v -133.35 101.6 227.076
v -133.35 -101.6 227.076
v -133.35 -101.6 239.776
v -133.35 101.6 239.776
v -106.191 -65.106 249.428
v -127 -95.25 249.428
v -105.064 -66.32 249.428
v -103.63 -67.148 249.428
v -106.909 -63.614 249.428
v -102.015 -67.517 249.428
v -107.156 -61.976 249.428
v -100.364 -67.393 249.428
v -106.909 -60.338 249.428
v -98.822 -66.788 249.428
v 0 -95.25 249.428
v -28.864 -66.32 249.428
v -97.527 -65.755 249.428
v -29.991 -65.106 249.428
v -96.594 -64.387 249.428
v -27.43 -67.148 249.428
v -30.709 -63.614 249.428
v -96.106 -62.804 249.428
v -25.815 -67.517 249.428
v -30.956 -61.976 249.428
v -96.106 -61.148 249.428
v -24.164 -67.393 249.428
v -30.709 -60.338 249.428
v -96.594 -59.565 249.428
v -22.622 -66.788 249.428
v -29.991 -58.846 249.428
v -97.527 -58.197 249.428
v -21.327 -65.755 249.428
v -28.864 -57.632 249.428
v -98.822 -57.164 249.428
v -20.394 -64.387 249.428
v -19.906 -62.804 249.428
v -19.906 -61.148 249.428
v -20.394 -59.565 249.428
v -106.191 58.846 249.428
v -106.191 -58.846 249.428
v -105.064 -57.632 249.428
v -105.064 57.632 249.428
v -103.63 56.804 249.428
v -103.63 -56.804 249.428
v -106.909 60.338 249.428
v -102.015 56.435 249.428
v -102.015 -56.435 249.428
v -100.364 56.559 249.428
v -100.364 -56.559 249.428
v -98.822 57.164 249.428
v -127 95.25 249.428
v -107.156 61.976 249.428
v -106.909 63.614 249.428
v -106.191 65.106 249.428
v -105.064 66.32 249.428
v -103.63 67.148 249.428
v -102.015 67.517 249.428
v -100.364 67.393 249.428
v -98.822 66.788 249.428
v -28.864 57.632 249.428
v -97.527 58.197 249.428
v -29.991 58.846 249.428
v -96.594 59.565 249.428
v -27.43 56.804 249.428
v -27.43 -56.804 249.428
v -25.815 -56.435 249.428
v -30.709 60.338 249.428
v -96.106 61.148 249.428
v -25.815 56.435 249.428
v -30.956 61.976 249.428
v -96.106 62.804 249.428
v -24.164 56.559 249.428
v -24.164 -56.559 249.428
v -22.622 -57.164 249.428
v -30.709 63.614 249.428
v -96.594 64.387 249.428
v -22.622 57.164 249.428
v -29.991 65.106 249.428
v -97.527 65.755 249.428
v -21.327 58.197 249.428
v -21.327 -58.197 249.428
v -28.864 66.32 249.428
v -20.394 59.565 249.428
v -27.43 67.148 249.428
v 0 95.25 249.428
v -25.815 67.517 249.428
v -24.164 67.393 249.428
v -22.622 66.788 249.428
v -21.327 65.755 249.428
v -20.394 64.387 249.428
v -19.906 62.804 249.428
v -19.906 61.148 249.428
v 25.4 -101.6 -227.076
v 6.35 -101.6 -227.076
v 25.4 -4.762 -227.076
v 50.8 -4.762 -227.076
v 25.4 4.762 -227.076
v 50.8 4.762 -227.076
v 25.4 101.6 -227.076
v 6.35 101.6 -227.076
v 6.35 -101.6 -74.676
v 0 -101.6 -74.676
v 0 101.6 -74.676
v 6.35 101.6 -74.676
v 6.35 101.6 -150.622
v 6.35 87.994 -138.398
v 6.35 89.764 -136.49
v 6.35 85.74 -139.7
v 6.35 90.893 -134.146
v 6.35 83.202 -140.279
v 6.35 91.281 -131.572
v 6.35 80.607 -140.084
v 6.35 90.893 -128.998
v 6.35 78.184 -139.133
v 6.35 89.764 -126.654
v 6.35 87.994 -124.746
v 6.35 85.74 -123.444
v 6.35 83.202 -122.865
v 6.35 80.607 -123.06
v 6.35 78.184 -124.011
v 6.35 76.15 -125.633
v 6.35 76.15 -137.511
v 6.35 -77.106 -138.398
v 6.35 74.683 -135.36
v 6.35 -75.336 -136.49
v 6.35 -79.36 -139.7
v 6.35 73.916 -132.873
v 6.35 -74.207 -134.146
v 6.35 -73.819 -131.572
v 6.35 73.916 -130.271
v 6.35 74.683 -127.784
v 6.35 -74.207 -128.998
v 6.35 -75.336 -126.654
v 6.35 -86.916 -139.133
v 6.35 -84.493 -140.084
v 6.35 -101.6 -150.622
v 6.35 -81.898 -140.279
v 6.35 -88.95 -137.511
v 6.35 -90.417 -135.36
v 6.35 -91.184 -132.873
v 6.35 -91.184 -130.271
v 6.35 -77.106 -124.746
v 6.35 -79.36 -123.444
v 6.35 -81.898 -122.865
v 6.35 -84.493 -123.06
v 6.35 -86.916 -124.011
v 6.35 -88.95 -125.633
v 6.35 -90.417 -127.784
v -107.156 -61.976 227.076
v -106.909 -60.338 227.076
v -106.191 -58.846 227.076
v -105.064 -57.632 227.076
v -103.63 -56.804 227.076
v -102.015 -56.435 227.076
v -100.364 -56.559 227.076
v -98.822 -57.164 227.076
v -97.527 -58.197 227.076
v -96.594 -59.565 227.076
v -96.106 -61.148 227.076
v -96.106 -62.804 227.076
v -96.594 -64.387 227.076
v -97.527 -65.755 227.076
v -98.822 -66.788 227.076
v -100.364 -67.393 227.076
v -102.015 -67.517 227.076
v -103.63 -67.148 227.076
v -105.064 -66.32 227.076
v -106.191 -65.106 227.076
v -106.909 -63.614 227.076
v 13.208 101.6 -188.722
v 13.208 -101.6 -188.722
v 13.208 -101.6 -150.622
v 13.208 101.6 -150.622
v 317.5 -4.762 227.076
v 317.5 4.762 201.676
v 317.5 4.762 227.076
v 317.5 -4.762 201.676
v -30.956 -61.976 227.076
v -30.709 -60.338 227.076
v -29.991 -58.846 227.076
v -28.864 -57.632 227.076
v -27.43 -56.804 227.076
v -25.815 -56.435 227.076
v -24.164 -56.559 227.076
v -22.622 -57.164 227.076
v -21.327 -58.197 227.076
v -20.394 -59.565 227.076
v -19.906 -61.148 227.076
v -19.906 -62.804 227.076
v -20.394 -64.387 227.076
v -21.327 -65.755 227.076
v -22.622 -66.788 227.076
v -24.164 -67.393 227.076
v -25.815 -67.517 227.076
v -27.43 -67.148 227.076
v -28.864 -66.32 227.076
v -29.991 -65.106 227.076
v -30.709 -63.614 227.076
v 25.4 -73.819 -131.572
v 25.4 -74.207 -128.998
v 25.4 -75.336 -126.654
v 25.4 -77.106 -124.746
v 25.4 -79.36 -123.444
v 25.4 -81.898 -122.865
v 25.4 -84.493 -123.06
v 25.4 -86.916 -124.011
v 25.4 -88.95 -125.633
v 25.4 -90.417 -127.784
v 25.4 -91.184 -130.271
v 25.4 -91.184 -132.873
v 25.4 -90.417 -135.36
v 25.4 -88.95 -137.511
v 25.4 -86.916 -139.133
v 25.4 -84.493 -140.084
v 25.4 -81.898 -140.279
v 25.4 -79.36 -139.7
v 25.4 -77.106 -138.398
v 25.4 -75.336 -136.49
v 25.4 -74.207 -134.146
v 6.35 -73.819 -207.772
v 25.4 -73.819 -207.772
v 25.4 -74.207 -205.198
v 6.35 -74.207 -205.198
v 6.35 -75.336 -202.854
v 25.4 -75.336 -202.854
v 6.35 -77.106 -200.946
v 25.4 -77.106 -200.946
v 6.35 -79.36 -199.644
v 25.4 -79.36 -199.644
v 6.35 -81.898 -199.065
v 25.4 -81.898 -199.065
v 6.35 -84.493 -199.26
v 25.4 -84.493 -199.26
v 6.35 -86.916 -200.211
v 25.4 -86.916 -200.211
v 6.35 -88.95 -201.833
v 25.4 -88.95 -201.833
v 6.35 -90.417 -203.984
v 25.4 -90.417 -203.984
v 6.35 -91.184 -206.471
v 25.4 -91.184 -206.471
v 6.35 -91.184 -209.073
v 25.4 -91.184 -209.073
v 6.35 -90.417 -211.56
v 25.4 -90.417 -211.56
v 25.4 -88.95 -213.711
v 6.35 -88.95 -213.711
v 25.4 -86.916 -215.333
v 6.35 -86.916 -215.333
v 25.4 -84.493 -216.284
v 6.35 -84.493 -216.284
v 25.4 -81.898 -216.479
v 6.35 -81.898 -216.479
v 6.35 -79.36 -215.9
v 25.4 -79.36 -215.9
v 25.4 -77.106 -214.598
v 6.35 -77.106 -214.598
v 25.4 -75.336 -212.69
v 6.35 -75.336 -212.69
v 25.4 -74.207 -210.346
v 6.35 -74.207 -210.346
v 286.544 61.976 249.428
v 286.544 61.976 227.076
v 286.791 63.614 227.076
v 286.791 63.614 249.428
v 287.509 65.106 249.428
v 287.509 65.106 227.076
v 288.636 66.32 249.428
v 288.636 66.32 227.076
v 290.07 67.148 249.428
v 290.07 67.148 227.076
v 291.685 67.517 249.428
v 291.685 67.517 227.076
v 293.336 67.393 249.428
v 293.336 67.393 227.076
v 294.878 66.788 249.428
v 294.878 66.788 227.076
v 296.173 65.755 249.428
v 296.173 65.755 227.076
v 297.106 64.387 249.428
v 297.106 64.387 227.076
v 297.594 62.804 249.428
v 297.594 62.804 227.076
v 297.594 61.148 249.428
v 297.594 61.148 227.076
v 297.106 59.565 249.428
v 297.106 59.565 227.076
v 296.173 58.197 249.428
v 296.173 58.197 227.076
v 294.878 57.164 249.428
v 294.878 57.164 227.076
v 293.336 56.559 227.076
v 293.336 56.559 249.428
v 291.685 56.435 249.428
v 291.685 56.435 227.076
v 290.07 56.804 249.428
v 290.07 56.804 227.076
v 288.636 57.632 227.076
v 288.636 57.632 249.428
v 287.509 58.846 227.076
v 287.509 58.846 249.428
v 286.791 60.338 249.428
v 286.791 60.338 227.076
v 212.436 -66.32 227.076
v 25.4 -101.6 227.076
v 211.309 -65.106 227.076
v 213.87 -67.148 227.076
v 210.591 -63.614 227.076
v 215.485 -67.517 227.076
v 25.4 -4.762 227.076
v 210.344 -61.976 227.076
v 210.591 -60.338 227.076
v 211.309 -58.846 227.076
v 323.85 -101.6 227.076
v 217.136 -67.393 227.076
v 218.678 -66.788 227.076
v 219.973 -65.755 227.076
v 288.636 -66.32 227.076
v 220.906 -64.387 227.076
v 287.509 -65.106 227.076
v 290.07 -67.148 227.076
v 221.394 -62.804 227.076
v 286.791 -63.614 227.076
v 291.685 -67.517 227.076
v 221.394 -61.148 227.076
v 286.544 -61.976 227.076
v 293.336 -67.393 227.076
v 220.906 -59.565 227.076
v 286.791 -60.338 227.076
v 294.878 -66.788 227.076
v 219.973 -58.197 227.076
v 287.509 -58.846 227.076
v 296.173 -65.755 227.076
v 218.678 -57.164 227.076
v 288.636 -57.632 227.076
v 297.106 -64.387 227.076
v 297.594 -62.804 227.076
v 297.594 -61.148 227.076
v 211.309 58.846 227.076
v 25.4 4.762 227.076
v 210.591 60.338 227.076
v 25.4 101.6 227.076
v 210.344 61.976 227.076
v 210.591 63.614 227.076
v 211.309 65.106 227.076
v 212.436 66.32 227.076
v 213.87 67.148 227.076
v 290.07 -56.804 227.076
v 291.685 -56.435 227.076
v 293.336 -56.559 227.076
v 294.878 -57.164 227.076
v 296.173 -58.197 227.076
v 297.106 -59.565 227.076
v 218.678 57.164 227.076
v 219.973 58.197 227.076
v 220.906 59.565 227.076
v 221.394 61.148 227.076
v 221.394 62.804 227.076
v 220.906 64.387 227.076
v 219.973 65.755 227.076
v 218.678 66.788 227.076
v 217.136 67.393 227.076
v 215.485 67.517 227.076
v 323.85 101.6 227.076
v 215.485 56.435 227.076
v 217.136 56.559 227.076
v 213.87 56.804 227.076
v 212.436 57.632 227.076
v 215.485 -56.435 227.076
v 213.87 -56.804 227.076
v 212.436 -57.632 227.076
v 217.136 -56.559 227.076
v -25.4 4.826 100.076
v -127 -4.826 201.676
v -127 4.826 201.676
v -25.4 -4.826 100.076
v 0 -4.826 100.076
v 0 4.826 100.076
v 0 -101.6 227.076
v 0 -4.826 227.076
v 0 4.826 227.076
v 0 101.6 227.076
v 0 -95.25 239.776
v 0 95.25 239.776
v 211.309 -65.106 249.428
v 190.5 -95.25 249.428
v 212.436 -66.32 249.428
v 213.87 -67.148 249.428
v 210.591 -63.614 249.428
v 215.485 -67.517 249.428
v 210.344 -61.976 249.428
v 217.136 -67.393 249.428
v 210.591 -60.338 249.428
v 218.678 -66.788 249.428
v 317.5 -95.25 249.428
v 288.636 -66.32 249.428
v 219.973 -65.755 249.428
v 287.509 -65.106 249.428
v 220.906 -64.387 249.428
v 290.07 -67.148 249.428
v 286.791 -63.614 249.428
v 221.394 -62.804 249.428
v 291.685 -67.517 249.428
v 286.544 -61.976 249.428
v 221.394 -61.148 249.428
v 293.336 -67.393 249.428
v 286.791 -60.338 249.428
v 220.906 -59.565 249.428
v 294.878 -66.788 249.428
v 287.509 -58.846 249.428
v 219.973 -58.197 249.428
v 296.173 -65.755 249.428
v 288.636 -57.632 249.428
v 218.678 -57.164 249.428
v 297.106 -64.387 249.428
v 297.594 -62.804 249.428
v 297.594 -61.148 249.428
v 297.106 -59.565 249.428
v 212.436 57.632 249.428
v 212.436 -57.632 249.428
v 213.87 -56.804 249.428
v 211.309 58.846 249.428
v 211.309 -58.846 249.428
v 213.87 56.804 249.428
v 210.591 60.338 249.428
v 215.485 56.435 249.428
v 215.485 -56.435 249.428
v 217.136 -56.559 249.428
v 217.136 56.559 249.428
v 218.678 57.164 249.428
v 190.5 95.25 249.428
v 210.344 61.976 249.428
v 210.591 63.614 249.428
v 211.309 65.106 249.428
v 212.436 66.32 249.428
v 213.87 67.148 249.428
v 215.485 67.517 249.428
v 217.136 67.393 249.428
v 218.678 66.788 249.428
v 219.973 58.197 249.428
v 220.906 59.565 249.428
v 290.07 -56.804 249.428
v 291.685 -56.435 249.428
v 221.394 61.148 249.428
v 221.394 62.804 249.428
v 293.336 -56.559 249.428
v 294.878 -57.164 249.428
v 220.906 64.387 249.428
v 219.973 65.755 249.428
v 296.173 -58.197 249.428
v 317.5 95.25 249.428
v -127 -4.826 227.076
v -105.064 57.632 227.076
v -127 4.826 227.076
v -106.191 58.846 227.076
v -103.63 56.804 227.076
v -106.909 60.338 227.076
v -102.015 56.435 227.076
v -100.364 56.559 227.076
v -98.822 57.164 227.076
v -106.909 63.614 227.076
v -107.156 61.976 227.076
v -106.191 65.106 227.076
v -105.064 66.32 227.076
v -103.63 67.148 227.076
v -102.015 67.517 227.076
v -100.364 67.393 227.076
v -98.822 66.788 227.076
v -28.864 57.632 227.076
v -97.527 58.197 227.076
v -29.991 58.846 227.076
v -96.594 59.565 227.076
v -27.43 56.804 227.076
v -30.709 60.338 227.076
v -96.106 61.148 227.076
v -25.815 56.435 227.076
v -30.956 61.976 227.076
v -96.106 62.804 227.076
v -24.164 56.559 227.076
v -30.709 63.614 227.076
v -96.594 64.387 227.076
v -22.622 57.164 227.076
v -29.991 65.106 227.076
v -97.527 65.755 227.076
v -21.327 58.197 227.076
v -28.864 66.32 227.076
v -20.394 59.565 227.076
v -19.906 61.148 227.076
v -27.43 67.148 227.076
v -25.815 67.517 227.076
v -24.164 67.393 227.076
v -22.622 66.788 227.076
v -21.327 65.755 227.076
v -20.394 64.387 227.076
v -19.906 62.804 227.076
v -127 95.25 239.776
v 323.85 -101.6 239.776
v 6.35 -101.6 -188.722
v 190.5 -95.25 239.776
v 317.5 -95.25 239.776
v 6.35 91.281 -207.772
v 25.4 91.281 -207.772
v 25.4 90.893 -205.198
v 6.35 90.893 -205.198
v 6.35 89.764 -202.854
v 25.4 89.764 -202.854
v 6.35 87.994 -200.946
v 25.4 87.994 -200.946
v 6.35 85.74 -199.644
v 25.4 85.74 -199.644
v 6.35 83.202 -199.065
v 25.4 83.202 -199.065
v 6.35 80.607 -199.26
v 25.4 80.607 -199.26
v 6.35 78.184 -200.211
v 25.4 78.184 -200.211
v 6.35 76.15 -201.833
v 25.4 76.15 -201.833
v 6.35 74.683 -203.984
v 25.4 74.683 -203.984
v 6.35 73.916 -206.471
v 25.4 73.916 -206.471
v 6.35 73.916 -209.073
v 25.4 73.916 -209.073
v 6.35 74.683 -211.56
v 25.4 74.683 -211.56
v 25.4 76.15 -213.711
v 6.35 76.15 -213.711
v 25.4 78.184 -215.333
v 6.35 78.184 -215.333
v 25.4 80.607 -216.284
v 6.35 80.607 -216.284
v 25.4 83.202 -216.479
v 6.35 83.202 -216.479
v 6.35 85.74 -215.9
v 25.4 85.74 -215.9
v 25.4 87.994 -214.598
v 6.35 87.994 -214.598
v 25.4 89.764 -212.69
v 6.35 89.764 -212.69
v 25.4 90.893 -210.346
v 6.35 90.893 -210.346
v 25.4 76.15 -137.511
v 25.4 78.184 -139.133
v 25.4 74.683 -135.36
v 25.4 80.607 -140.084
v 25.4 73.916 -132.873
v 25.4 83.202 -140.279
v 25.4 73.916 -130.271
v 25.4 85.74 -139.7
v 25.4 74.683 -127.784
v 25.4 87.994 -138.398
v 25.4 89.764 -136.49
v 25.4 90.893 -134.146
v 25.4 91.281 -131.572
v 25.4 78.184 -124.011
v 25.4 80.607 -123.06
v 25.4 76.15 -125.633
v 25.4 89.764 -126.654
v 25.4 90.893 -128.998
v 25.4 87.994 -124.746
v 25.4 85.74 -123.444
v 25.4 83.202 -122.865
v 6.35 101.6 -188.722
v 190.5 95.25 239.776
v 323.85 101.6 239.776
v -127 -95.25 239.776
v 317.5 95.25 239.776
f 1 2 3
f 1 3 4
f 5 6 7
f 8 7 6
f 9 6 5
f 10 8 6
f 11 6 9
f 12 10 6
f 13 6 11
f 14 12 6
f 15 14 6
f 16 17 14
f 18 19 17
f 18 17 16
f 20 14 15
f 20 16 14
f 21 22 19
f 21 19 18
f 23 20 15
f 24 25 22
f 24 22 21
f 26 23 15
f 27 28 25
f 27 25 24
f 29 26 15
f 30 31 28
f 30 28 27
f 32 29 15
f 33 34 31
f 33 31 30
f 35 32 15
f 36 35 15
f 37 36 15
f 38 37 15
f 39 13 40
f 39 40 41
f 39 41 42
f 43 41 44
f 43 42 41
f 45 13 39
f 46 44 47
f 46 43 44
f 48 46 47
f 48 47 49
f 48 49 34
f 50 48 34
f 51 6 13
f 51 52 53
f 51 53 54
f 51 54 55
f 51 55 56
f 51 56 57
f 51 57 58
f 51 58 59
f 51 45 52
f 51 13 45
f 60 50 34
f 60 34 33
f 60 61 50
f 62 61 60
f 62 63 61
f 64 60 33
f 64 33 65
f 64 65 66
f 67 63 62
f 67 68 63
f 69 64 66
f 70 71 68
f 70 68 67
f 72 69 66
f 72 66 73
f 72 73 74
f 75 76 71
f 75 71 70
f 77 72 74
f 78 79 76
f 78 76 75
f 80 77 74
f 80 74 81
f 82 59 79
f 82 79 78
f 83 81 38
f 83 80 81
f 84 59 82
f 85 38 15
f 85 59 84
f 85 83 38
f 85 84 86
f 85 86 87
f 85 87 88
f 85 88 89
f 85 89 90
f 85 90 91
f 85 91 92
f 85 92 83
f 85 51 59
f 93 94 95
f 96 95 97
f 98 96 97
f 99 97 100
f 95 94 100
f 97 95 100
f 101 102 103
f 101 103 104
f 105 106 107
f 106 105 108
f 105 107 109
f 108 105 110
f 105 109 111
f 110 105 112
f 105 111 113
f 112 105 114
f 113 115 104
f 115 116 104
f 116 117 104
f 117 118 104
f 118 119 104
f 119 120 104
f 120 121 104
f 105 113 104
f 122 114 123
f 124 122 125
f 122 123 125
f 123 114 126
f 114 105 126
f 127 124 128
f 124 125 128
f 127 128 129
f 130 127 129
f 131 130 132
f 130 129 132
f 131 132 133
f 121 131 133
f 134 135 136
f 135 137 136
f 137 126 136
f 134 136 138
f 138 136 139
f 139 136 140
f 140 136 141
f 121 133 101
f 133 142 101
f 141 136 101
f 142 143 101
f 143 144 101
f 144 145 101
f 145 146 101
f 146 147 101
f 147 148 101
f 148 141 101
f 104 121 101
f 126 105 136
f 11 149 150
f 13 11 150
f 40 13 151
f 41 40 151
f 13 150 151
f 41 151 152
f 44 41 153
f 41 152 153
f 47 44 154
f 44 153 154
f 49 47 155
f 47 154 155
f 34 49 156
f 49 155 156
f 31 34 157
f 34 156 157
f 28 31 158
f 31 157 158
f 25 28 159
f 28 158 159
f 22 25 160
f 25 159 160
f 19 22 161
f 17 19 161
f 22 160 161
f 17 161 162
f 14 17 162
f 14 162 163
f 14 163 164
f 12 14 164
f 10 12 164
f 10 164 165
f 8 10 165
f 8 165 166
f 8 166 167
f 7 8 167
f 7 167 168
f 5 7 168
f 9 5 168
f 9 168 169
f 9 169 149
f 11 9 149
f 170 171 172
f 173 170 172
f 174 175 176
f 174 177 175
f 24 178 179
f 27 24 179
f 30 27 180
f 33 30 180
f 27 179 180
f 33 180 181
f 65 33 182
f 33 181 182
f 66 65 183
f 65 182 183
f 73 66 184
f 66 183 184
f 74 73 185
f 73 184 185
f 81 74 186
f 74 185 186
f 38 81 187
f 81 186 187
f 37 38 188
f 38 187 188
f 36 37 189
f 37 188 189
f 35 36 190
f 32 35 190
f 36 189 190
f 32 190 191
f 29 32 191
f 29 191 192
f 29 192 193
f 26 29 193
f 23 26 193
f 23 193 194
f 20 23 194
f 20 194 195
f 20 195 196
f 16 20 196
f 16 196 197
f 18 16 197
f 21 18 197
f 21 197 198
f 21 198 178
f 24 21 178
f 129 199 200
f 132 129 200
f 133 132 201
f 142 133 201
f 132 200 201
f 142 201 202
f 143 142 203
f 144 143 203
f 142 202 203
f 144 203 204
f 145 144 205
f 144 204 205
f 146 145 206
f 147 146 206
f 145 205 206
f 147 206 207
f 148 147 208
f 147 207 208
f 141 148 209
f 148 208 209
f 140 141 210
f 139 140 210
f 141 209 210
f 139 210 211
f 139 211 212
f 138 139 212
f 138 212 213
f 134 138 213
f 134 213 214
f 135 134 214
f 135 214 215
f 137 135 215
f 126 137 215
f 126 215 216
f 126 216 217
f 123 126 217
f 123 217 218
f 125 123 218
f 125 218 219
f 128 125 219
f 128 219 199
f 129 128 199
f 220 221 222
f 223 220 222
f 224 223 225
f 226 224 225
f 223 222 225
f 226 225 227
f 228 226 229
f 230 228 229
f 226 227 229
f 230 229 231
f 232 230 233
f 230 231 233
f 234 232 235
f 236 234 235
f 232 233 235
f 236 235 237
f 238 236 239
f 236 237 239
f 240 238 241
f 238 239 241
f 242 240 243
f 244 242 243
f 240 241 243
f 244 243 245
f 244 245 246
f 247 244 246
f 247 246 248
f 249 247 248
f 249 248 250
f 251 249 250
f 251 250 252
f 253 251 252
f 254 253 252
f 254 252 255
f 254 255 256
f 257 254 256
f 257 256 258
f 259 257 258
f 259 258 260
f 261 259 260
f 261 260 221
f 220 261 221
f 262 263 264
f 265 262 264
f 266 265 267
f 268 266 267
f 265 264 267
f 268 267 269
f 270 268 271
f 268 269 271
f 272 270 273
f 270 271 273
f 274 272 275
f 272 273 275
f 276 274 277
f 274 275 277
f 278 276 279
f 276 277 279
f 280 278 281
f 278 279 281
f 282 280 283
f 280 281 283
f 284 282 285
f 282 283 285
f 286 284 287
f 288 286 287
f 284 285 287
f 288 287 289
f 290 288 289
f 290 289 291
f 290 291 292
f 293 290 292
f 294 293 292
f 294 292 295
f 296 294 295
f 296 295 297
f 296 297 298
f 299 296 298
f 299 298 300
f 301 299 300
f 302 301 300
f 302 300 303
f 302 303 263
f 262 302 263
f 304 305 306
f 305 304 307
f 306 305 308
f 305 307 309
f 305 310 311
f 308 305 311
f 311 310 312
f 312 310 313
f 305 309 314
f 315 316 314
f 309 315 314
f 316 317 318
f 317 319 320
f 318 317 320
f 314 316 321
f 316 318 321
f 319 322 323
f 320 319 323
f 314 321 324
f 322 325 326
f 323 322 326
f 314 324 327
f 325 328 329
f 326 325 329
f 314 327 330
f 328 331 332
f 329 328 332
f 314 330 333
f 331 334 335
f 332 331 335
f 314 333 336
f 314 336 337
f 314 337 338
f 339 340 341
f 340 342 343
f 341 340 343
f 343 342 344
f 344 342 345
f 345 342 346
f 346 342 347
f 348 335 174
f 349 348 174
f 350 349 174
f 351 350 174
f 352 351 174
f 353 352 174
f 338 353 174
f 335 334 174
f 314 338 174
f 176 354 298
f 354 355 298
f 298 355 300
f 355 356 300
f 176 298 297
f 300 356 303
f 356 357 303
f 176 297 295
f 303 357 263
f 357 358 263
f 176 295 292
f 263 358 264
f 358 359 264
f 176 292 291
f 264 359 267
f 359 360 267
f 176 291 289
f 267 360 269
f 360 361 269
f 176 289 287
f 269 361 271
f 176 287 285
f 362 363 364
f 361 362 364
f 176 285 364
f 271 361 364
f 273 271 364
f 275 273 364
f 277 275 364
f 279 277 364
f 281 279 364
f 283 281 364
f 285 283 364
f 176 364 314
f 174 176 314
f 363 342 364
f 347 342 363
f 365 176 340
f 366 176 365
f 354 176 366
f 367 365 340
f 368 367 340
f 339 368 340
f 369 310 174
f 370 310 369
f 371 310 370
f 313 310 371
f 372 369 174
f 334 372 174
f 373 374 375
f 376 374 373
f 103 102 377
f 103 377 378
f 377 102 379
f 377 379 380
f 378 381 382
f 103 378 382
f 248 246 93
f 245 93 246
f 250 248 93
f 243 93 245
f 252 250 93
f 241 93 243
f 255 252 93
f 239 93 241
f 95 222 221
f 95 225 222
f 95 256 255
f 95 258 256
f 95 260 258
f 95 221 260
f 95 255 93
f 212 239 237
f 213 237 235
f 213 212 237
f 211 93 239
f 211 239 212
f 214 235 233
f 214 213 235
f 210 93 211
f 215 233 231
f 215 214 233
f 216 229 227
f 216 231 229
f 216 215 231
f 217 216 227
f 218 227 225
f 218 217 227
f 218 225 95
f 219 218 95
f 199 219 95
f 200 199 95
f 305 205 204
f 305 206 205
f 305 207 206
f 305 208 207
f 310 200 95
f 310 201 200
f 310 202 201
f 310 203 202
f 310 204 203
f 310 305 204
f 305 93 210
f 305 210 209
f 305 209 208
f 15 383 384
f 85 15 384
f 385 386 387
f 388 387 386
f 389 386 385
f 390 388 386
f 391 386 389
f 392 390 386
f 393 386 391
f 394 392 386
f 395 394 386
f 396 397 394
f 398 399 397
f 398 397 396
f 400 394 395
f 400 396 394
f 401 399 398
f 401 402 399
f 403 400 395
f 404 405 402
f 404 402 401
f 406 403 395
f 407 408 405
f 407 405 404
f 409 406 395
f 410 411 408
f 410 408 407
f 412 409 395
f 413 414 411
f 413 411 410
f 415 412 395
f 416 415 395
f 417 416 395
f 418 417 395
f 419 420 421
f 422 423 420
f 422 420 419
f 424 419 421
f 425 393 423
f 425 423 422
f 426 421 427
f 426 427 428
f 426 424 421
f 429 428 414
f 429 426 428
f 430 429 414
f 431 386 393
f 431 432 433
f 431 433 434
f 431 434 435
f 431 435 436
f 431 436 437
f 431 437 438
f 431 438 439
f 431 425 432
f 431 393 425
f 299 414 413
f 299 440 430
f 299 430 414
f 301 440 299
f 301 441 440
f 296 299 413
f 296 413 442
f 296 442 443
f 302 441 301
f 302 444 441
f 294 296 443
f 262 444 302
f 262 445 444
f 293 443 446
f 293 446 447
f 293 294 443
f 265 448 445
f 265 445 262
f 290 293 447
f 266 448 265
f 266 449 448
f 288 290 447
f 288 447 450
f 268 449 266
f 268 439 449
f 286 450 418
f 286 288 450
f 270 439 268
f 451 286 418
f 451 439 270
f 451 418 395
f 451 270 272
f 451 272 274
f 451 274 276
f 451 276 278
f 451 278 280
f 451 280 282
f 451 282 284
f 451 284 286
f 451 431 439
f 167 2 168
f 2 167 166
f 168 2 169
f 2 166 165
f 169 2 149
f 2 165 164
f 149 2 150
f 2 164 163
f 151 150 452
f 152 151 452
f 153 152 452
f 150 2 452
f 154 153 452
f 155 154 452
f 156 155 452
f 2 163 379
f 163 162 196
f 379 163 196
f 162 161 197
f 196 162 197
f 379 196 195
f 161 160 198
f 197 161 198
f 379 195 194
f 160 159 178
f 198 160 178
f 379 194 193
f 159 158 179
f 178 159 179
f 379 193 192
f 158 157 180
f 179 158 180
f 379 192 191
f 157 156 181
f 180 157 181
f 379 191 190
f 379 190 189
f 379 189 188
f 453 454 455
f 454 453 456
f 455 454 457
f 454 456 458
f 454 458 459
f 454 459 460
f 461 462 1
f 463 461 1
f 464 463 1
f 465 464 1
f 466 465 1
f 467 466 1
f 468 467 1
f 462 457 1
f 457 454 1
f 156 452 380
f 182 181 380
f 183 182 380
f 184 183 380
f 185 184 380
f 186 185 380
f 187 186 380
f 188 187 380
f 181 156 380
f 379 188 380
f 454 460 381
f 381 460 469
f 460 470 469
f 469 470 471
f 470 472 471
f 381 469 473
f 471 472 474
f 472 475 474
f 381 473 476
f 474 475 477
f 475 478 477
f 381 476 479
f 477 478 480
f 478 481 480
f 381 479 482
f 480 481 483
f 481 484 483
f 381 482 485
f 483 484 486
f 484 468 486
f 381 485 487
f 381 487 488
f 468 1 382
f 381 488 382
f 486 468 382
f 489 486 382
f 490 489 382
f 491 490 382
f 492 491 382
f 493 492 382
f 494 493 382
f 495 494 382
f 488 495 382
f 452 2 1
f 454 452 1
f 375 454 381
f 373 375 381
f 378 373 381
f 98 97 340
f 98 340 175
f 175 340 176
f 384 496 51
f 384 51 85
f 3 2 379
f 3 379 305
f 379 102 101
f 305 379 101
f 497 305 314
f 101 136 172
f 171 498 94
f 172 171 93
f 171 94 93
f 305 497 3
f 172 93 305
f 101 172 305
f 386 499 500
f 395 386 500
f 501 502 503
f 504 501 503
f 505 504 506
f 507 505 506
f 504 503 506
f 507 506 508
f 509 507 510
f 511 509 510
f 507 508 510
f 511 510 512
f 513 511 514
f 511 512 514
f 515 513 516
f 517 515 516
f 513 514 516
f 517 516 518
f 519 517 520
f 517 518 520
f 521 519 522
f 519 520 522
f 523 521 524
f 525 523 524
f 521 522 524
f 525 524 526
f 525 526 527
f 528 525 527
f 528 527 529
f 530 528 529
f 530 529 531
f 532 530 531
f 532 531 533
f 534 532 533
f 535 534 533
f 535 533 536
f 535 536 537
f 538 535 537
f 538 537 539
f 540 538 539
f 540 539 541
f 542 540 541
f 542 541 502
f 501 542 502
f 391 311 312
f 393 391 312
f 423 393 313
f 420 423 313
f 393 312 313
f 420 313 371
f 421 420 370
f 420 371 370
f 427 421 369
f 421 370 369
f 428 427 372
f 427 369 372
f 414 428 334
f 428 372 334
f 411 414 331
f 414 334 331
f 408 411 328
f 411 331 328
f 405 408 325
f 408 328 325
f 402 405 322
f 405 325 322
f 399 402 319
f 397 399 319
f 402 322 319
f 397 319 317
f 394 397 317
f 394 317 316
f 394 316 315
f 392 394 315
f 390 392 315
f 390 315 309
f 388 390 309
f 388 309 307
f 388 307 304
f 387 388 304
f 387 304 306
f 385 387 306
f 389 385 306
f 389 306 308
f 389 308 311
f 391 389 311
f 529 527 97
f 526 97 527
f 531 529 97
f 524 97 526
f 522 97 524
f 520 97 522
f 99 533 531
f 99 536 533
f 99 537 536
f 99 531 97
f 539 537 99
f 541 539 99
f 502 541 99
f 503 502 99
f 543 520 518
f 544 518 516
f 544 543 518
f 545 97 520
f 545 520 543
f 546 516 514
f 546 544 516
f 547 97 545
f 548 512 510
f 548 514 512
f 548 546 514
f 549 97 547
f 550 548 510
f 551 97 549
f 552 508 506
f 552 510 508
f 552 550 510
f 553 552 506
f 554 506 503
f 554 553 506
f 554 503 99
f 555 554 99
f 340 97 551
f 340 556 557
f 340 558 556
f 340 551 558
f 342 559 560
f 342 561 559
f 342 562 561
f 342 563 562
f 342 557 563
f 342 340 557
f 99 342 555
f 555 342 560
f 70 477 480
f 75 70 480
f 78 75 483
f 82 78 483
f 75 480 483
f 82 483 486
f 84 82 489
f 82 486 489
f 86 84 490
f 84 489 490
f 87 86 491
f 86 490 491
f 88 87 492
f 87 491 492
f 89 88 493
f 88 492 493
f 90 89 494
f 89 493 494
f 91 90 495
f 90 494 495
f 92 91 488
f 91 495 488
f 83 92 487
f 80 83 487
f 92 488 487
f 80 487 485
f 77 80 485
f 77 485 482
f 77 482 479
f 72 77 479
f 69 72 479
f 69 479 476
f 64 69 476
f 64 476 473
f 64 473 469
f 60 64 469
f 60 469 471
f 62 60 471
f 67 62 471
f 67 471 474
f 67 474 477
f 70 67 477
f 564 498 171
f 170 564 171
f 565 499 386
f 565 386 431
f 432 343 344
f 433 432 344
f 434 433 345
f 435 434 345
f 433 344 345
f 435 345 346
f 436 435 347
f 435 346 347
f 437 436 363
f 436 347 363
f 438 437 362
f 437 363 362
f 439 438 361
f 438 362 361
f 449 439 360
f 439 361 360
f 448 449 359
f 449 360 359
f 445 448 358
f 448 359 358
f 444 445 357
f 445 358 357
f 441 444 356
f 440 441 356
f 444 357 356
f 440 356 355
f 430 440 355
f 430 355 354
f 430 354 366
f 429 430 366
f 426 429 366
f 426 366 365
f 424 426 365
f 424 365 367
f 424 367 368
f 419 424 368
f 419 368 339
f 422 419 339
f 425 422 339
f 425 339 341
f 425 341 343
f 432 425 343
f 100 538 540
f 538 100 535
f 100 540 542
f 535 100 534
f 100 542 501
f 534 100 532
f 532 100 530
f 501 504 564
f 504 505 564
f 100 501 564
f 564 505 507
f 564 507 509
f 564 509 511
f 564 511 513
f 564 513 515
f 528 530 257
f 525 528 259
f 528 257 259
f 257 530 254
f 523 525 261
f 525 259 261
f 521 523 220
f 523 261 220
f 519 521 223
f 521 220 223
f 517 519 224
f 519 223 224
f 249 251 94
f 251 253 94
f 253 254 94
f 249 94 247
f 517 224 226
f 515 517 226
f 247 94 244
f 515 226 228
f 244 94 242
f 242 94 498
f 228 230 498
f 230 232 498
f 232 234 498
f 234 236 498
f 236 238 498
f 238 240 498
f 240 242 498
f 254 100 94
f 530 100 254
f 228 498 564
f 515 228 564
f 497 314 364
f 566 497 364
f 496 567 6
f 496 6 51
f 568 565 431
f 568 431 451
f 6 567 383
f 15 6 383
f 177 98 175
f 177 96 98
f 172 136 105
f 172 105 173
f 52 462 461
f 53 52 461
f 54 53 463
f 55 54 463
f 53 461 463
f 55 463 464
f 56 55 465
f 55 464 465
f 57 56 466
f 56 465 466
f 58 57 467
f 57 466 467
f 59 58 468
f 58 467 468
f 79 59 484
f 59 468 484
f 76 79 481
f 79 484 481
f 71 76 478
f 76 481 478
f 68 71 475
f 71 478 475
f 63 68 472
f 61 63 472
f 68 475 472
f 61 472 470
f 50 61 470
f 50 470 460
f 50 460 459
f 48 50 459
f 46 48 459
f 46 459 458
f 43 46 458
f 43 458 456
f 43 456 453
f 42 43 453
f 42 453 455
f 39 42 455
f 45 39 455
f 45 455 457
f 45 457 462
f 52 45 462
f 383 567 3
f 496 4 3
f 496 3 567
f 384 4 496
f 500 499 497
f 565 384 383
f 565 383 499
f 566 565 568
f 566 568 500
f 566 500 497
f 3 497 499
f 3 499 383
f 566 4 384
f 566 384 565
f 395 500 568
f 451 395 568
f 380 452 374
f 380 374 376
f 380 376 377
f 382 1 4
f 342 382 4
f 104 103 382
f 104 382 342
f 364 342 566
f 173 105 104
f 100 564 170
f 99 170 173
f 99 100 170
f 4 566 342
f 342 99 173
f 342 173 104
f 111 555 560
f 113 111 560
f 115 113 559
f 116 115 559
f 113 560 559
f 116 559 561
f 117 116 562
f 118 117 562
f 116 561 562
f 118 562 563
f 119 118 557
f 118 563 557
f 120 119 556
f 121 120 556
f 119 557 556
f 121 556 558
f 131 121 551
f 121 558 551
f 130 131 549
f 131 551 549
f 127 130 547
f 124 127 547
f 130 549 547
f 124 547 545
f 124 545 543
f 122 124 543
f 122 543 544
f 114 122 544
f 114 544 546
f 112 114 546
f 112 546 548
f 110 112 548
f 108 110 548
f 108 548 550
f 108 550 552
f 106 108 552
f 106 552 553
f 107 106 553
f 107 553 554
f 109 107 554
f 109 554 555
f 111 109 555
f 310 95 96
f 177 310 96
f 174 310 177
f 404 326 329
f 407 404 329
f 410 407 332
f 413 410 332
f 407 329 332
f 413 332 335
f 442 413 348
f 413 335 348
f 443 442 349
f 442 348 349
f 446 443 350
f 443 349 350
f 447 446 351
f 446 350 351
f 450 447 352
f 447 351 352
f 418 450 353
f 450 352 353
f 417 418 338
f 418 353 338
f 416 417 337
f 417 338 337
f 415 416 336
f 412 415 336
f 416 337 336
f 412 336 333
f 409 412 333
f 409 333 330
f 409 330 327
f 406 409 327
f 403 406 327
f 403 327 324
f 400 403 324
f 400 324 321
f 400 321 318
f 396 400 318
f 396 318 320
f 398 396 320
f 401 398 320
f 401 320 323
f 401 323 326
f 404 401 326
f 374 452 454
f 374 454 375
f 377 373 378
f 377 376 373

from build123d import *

# Parameters (mm, degrees)
F0_W      = 203.2
F0_H      = 454.152
F1_DEPTH  = 25.4
F2_W      = 6.35
F2_H      = 152.4
F3_DEPTH  = 203.201
F4_W      = 457.2
F4_H      = 203.2
F5_DEPTH  = 12.7
F6_W      = 127
F6_H      = 190.5
F7_DEPTH  = 9.652
F9_D      = 11.1125
F11_DEPTH = 4.7625
F12_W     = 38.1
F12_H     = 38.1
F13_DEPTH = 203.201
F15_D     = 17.4625
F17_DEPTH = 4.826


# Not quite as in the source:
# - a length typed as a fraction of an inch, garbled in the dataset ("3 / 203.2 mm" for 3/8 in), is restored


with BuildPart() as f1:
    # F0 (on Right) → F1 (new body)
    with BuildSketch(Plane.YZ):
        Rectangle(F0_W, F0_H)
    extrude(amount=F1_DEPTH)

    # F2 (on face) → F3 (cut, through all)
    with BuildSketch(Plane.XZ.offset(101.6)):
        with Locations((3.175, -150.876)):
            Rectangle(F2_W, F2_H)
    extrude(amount=-F3_DEPTH, mode=Mode.SUBTRACT)

    # F4 (on face) → F5 (join)
    with BuildSketch(Plane.XY.offset(227.076)):
        with Locations((95.25, 0)):
            Rectangle(F4_W, F4_H)
    extrude(amount=F5_DEPTH)

    # F6 (on face) → F7 (join)
    with BuildSketch(Plane.XY.offset(239.776)):
        with Locations((-63.5, 0)):
            Rectangle(F6_W, F6_H)
        with Locations((254, 0)):
            Rectangle(F6_W, F6_H)
    extrude(amount=F7_DEPTH)

    # F9 (through all)
    with Locations(Plane.XY.offset(249.428)):
        with Locations((-101.6, 61.976), (-25.4, 61.976), (-101.6, -61.976), (-25.4, -61.976), (215.9, 61.976), (292.1, 61.976), (215.9, -61.976), (292.1, -61.976)):
            Hole(F9_D / 2)

    # F10 (on Front) → F11 (join, symmetric)
    with BuildSketch(Plane.XZ):
        Polygon((317.5, 227.076), (25.4, 227.076), (25.4, -227.076), (50.8, -227.076), (317.5, 201.676), align=None)
    extrude(amount=F11_DEPTH, both=True)

    # F12 (on face) → F13 (cut, through all)
    with BuildSketch(Plane.XZ.offset(101.6)):
        with Locations((-5.842, -169.672)):
            Rectangle(F12_W, F12_H)
    extrude(amount=-F13_DEPTH, mode=Mode.SUBTRACT)

    # F15 (through all)
    with Locations(Plane(origin=(6.35, 0, 0), x_dir=(0, -1, 0), z_dir=(-1, 0, 0))):
        with Locations((-82.55, -131.572), (82.55, -131.572), (82.55, -207.772), (-82.55, -207.772)):
            Hole(F15_D / 2)

    # F16 (on Front) → F17 (join, symmetric)
    with BuildSketch(Plane.XZ):
        Polygon((0, 100.076), (0, 227.076), (-127, 227.076), (-127, 201.676), (-25.4, 100.076), align=None)
    extrude(amount=F17_DEPTH, both=True)


solid = f1.part
